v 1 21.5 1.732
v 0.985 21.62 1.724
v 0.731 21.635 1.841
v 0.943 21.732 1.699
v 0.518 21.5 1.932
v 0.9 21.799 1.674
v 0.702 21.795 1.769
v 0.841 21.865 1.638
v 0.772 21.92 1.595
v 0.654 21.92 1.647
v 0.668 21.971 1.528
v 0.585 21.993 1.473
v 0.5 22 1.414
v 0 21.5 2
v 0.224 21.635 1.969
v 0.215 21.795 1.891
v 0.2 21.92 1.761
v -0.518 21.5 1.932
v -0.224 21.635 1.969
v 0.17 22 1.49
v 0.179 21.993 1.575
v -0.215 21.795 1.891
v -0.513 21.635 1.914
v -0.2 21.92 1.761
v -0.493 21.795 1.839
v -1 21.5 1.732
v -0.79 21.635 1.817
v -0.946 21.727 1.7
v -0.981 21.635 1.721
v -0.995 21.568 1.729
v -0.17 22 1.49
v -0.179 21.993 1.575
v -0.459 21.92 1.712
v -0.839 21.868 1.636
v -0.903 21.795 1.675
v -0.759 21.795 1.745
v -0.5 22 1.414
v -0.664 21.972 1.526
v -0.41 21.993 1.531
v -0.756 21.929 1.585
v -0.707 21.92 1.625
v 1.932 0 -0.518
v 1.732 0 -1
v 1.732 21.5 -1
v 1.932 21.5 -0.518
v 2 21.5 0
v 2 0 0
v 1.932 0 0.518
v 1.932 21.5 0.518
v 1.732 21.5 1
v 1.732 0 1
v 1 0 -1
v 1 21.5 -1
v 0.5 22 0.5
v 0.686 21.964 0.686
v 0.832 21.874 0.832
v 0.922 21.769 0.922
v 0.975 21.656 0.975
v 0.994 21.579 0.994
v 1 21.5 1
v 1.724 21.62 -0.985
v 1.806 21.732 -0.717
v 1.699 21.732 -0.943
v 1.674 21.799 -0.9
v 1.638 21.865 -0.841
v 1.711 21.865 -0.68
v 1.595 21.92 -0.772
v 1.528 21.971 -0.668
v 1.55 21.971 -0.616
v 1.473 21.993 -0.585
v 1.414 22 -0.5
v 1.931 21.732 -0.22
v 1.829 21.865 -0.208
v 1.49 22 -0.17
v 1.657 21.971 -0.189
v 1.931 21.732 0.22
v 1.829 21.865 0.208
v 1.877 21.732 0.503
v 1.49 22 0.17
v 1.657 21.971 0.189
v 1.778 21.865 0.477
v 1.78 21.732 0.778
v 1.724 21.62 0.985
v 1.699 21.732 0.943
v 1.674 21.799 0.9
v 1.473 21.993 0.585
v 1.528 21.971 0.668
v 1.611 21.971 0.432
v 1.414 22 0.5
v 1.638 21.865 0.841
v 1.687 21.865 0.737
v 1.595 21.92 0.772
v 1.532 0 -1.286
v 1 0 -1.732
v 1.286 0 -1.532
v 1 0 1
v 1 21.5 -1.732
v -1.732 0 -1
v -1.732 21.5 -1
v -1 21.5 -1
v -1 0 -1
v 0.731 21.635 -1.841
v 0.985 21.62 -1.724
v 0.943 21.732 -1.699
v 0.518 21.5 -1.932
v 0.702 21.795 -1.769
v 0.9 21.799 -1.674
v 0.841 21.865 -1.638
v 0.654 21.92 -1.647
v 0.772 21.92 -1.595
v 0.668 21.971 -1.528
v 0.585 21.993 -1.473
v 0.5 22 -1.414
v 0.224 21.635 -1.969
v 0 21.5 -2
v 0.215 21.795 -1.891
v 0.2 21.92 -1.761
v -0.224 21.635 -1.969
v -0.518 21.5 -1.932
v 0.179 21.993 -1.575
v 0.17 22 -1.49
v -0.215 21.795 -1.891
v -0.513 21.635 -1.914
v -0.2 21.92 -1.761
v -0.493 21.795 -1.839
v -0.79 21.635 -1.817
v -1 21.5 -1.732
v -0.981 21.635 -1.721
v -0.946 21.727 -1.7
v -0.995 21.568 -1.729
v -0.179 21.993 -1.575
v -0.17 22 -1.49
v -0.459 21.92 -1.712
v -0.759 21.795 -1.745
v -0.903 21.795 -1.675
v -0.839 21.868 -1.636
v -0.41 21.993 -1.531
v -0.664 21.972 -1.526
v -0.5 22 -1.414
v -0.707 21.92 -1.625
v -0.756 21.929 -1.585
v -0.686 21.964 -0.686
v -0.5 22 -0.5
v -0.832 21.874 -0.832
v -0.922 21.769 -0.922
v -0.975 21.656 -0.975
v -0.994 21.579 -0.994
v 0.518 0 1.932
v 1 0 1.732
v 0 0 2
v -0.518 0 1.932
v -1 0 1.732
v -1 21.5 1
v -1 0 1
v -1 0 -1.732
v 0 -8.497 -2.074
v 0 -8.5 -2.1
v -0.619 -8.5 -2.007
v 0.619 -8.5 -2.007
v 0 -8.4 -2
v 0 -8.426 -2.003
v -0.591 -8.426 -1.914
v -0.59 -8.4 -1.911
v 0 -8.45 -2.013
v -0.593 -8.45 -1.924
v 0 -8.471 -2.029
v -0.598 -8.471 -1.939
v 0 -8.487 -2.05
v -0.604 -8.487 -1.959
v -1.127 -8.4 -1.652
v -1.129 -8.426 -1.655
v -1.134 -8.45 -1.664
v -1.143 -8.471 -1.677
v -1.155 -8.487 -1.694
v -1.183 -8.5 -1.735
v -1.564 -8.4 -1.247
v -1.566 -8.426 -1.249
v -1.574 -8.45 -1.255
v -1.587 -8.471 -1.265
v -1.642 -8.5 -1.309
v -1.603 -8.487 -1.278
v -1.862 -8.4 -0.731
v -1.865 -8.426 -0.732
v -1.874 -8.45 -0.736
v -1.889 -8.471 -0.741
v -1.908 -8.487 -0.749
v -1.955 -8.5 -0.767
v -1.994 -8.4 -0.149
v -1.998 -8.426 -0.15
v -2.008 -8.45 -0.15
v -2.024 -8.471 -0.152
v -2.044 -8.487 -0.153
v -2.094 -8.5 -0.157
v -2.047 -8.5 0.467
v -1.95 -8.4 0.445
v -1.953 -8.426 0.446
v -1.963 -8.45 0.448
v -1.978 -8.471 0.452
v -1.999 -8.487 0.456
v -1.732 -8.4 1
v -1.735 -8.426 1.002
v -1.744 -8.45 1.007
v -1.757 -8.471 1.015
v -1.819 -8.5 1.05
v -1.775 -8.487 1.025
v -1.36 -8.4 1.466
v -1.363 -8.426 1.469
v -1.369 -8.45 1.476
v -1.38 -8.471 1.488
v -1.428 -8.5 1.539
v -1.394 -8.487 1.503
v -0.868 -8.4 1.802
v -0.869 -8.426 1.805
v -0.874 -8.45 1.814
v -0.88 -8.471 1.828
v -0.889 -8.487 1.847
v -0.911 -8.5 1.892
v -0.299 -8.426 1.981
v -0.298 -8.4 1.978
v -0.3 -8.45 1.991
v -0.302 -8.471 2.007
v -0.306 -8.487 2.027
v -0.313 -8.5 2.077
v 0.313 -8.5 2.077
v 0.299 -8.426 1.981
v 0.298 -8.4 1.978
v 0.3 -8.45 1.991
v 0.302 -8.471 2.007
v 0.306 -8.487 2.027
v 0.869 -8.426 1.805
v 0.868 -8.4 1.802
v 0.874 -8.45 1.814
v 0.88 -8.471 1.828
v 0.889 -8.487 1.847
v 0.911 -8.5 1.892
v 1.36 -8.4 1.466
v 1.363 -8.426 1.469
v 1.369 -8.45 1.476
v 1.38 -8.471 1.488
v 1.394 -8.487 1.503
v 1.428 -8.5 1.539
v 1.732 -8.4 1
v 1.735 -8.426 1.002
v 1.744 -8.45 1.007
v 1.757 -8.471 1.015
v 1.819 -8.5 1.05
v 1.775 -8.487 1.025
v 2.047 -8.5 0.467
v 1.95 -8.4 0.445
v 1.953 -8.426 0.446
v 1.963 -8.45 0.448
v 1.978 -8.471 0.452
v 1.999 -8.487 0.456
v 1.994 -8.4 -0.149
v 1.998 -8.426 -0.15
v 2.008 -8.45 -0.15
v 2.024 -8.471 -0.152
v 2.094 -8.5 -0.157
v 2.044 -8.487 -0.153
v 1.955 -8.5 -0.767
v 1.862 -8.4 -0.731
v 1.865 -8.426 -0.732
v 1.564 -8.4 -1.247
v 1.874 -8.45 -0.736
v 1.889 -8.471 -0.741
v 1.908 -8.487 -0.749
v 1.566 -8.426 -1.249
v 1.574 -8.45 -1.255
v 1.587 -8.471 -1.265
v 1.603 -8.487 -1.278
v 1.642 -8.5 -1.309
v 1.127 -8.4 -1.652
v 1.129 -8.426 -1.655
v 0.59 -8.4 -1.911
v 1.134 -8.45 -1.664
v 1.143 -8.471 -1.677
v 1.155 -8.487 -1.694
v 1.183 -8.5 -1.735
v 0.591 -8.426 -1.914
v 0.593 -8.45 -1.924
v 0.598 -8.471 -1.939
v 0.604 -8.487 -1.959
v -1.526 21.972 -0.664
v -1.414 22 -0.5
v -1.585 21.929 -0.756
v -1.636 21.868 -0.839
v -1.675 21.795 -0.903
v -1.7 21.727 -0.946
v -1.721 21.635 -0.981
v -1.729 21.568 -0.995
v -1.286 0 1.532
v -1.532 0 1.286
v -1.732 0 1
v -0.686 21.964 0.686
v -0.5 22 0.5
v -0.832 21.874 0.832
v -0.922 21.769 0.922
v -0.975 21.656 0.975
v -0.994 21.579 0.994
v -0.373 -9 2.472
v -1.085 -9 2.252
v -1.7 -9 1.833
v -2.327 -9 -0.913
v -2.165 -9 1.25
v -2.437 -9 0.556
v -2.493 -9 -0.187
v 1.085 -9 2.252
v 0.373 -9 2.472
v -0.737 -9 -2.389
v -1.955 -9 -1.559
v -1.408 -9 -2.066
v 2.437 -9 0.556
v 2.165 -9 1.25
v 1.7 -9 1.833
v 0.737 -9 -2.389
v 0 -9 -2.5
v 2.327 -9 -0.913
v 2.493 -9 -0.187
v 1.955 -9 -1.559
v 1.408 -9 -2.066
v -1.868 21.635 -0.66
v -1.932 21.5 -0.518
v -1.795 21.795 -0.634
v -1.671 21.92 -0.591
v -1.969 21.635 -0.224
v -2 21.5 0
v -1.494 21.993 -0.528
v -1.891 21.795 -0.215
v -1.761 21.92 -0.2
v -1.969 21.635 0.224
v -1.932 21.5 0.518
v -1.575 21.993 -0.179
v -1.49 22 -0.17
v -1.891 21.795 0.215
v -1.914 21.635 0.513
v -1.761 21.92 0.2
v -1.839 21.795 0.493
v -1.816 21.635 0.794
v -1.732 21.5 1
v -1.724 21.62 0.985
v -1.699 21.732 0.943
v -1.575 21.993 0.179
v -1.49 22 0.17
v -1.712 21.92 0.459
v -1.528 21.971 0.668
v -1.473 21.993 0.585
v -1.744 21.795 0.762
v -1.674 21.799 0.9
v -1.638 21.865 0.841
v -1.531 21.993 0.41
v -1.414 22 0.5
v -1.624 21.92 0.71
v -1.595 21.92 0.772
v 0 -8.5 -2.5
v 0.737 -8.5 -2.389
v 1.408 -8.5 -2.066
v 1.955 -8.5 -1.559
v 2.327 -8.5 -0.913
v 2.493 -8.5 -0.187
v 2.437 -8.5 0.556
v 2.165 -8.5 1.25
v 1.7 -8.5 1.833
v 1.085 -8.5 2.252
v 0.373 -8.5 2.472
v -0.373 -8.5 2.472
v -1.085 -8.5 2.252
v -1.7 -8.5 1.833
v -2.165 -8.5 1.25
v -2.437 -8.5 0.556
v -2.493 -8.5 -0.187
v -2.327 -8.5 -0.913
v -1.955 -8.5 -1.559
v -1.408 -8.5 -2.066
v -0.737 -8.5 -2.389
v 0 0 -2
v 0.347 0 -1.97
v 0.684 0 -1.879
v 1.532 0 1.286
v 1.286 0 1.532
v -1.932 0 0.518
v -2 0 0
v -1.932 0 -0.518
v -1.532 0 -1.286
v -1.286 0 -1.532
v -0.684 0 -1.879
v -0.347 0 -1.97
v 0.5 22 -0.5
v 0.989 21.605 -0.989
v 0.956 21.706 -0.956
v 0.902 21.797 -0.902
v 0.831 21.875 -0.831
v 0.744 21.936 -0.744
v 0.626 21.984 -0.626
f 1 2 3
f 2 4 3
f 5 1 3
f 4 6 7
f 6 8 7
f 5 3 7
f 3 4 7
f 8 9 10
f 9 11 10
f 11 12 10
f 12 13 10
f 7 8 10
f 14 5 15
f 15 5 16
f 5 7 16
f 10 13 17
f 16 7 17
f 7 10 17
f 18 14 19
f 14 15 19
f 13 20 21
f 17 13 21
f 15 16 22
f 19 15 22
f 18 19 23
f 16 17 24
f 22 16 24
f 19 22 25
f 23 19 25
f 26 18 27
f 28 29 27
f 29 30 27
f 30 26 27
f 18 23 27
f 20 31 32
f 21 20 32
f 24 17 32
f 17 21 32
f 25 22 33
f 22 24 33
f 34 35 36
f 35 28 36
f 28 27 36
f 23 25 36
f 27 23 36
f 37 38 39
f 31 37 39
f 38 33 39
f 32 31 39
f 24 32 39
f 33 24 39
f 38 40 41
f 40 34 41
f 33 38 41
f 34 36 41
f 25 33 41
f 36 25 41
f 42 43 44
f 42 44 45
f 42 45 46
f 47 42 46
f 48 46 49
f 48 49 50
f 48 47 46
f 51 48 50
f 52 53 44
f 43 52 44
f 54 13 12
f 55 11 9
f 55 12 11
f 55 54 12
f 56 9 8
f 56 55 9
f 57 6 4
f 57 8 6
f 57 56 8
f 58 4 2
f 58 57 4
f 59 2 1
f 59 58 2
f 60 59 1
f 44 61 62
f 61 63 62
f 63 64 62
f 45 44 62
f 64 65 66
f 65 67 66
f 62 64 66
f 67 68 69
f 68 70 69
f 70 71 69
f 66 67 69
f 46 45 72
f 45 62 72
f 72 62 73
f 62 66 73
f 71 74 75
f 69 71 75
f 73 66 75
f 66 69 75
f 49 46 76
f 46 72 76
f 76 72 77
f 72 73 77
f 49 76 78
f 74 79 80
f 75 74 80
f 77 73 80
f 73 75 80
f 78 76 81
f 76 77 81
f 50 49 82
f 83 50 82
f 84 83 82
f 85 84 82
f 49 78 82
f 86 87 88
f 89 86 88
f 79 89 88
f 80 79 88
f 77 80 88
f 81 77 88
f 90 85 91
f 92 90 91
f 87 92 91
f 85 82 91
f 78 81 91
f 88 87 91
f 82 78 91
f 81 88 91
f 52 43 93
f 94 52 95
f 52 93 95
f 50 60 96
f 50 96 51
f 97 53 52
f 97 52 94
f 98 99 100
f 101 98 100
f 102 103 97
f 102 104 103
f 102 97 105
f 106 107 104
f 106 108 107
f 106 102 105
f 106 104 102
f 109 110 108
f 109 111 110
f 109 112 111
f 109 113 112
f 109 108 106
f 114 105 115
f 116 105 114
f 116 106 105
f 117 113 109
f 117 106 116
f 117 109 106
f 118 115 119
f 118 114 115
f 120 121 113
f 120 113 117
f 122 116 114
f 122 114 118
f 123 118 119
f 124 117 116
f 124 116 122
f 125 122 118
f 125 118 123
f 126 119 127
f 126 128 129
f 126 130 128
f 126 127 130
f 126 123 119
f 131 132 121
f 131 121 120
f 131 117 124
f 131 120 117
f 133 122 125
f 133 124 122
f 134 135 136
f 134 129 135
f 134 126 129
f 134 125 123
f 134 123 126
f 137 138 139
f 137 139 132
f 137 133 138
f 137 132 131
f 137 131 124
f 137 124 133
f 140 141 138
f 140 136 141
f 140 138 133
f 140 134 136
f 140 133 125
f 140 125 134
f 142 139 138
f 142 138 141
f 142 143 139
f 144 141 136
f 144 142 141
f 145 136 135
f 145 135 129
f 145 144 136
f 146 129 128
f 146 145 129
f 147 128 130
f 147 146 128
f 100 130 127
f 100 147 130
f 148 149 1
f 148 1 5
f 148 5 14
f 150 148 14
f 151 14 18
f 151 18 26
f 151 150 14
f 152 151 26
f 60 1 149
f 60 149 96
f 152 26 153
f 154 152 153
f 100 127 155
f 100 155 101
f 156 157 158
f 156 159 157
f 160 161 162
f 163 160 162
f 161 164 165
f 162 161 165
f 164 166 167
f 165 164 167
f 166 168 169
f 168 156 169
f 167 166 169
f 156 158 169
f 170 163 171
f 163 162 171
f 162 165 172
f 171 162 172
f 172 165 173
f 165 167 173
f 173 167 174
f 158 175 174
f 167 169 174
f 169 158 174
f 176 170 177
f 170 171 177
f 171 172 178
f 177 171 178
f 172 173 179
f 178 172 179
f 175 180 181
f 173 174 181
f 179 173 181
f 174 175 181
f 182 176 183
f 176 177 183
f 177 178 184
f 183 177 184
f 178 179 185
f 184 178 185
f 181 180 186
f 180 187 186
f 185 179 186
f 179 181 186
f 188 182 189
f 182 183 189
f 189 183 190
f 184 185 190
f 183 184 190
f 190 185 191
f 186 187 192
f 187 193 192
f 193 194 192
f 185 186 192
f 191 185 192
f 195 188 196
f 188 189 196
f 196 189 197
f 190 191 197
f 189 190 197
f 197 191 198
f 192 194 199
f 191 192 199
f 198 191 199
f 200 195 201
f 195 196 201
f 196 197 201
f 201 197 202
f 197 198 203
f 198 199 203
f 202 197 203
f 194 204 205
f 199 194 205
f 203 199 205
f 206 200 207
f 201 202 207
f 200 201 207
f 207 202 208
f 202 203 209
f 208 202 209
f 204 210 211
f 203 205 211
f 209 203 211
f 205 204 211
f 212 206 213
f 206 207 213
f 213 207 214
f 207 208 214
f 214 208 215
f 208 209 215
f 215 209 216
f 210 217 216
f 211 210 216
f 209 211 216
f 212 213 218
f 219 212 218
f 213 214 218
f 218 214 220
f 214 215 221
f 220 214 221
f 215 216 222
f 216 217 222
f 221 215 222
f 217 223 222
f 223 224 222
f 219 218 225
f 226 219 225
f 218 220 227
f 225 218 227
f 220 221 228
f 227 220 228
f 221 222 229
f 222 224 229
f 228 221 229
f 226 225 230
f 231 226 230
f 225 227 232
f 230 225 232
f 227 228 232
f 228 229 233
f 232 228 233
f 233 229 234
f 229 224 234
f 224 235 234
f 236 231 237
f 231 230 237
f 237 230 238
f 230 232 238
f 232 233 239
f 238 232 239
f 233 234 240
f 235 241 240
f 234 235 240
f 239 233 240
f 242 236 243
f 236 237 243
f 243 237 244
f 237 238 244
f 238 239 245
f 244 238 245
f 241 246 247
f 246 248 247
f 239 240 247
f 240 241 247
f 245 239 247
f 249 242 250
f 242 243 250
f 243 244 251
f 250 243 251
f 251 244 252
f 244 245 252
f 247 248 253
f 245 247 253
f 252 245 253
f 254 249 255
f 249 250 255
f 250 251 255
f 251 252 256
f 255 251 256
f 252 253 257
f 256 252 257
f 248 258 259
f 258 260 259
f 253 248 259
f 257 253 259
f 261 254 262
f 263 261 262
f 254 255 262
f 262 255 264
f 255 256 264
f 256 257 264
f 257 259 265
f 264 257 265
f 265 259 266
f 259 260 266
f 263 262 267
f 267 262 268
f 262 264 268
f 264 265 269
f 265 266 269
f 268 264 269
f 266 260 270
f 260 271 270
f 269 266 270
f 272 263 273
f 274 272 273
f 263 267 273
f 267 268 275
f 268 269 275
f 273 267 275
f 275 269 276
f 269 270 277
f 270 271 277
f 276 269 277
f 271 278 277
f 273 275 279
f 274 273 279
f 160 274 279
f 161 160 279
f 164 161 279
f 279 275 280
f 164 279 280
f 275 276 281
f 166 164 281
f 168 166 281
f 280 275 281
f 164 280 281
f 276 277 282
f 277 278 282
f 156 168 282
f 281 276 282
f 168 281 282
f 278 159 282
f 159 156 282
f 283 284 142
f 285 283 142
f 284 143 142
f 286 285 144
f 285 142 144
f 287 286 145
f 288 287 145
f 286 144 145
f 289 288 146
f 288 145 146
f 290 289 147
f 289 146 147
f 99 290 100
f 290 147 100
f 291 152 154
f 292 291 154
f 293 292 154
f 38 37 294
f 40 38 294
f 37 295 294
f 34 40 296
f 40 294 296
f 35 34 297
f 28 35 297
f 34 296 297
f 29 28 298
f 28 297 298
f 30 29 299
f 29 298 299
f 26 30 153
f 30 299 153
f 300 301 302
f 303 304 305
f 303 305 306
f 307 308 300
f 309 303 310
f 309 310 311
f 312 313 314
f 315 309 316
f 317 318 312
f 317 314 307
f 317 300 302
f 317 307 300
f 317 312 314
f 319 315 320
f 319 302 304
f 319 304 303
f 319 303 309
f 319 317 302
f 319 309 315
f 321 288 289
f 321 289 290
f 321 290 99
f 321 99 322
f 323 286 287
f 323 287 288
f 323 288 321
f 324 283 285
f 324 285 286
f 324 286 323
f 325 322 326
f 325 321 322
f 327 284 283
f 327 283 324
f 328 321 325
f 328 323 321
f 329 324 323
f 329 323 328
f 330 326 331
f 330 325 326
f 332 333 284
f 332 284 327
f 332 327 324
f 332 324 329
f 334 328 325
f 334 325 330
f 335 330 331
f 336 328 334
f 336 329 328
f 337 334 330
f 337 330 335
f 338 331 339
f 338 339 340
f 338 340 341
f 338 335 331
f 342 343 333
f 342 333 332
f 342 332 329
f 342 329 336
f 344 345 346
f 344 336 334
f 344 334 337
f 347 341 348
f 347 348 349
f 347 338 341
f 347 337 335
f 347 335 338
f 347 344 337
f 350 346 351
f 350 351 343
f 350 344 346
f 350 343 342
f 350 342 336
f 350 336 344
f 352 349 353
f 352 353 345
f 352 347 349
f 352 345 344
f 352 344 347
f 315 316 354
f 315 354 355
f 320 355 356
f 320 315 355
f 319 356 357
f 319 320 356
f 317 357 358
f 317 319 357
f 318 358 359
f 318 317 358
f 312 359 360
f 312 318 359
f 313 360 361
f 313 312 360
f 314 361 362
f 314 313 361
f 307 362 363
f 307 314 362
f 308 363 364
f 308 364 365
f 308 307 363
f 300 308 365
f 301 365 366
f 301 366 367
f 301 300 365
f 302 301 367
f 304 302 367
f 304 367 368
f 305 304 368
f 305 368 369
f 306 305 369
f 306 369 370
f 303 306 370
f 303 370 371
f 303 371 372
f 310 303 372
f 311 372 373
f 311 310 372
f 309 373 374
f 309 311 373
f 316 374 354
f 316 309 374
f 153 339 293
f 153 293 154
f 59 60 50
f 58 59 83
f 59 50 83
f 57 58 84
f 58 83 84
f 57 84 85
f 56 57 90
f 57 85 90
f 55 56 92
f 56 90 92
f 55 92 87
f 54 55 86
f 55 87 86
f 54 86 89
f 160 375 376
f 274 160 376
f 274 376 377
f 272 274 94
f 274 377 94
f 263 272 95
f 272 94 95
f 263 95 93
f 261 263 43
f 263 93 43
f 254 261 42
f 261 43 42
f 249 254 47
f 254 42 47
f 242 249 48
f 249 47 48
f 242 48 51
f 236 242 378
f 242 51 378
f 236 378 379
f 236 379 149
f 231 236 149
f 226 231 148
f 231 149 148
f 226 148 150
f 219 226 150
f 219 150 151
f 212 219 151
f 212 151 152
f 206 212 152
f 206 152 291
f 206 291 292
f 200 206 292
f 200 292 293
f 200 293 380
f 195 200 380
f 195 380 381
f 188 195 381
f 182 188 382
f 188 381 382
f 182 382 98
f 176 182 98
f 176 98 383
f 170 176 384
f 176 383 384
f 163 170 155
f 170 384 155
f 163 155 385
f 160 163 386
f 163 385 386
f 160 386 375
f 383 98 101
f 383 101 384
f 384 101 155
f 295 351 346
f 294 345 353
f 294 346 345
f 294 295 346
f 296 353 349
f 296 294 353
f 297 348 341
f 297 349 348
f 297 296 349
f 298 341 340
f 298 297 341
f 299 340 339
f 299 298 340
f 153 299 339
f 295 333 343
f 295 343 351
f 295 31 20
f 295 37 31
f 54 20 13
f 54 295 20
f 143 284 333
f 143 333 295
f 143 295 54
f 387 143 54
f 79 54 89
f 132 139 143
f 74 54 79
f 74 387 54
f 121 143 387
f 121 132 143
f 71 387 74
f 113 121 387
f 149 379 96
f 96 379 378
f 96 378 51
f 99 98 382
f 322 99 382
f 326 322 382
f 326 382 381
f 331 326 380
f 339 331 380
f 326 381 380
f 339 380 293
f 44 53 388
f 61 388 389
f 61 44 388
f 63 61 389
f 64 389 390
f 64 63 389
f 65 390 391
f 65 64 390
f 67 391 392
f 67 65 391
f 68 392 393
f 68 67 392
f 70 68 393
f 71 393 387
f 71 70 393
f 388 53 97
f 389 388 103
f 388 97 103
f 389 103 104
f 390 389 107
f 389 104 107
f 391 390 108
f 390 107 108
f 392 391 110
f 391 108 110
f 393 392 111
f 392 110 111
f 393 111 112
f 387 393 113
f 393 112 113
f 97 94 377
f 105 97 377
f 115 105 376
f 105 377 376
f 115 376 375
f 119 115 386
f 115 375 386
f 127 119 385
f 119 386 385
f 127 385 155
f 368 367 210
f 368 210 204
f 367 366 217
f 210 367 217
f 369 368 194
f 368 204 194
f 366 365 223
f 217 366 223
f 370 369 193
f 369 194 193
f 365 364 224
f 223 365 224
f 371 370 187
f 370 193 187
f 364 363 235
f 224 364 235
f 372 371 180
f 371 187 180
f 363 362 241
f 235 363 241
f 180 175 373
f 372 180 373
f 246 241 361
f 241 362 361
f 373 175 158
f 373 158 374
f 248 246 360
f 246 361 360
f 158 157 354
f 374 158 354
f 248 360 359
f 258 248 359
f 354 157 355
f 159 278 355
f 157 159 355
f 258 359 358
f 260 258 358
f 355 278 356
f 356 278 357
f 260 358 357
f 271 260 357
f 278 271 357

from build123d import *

# Parameters (mm, degrees)
SKETCH1_W           = 2
SKETCH1_H           = 0.732050808
SKETCH1_W_2         = 0.732050808
SKETCH1_H_2         = 2
BOSS_EXTRUDE1_DEPTH = 22
SKETCH2_R           = 2
BOSS_EXTRUDE2_DEPTH = 9
SKETCH3_R           = 2.5
BOSS_EXTRUDE3_DEPTH = 0.5
FILLET1_R           = 0.5
FILLET2_R           = 0.1


with BuildPart() as part:
    # Sketch1 → Boss-Extrude1 (new body)
    with BuildSketch(Plane(origin=(0, 0, 0), x_dir=(1, 0, 0), z_dir=(0, 1, 0))):
        with BuildLine():
            Line((-1, 1.732050808), (1, 1.732050808))
            ThreePointArc((1, 1.732050808), (0, 2), (-1, 1.732050808))
        make_face()
        with Locations((0, 1.366025404)):
            Rectangle(SKETCH1_W, SKETCH1_H)
        with BuildLine():
            Line((1.732050808, -1), (1.732050808, 1))
            ThreePointArc((1.732050808, 1), (2, 0), (1.732050808, -1))
        make_face()
        with Locations((1.366025404, 0)):
            Rectangle(SKETCH1_W_2, SKETCH1_H_2)
        Rectangle(SKETCH1_W, SKETCH1_H_2)
        with Locations((-1.366025404, 0)):
            Rectangle(SKETCH1_W_2, SKETCH1_H_2)
        with BuildLine():
            Line((-1.732050808, -1), (-1.732050808, 1))
            ThreePointArc((-1.732050808, 1), (-2, 0), (-1.732050808, -1))
        make_face()
        with Locations((0, -1.366025404)):
            Rectangle(SKETCH1_W, SKETCH1_H)
        with BuildLine():
            Line((-1, -1.732050808), (1, -1.732050808))
            ThreePointArc((1, -1.732050808), (0, -2), (-1, -1.732050808))
        make_face()
    extrude(amount=BOSS_EXTRUDE1_DEPTH)

    # Sketch2 → Boss-Extrude2 (add)
    with BuildSketch(Plane.XZ):
        with Locations(Location((0, 0, 0), (0, 0, 270))):
            Circle(SKETCH2_R)
    extrude(amount=BOSS_EXTRUDE2_DEPTH)

    # Sketch3 → Boss-Extrude3 (add)
    with BuildSketch(Plane.XZ.offset(9)):
        with Locations(Location((0, 0, 0), (0, 0, 270))):
            Circle(SKETCH3_R)
    extrude(amount=-BOSS_EXTRUDE3_DEPTH)

    # Fillet1
    fillet1_edges = [part.edges().sort_by_distance(p)[0] for p in [
        (-1, 22, -1.366025404),
        (-1.366025404, 22, -1),
        (-2, 22, 0),
        (-1.366025404, 22, 1),
        (-1, 22, 1.366025404),
        (0, 22, 2),
        (1, 22, 1.366025404),
        (1.366025404, 22, 1),
        (0, 22, -2),
        (2, 22, 0),
        (1.366025404, 22, -1),
        (1, 22, -1.366025404),
    ]]
    fillet(fillet1_edges, radius=FILLET1_R)

    # Fillet2
    fillet2_edges = [part.edges().sort_by_distance(p)[0] for p in [
        (0, -8.5, 2),
    ]]
    fillet(fillet2_edges, radius=FILLET2_R)


solid = part.part
